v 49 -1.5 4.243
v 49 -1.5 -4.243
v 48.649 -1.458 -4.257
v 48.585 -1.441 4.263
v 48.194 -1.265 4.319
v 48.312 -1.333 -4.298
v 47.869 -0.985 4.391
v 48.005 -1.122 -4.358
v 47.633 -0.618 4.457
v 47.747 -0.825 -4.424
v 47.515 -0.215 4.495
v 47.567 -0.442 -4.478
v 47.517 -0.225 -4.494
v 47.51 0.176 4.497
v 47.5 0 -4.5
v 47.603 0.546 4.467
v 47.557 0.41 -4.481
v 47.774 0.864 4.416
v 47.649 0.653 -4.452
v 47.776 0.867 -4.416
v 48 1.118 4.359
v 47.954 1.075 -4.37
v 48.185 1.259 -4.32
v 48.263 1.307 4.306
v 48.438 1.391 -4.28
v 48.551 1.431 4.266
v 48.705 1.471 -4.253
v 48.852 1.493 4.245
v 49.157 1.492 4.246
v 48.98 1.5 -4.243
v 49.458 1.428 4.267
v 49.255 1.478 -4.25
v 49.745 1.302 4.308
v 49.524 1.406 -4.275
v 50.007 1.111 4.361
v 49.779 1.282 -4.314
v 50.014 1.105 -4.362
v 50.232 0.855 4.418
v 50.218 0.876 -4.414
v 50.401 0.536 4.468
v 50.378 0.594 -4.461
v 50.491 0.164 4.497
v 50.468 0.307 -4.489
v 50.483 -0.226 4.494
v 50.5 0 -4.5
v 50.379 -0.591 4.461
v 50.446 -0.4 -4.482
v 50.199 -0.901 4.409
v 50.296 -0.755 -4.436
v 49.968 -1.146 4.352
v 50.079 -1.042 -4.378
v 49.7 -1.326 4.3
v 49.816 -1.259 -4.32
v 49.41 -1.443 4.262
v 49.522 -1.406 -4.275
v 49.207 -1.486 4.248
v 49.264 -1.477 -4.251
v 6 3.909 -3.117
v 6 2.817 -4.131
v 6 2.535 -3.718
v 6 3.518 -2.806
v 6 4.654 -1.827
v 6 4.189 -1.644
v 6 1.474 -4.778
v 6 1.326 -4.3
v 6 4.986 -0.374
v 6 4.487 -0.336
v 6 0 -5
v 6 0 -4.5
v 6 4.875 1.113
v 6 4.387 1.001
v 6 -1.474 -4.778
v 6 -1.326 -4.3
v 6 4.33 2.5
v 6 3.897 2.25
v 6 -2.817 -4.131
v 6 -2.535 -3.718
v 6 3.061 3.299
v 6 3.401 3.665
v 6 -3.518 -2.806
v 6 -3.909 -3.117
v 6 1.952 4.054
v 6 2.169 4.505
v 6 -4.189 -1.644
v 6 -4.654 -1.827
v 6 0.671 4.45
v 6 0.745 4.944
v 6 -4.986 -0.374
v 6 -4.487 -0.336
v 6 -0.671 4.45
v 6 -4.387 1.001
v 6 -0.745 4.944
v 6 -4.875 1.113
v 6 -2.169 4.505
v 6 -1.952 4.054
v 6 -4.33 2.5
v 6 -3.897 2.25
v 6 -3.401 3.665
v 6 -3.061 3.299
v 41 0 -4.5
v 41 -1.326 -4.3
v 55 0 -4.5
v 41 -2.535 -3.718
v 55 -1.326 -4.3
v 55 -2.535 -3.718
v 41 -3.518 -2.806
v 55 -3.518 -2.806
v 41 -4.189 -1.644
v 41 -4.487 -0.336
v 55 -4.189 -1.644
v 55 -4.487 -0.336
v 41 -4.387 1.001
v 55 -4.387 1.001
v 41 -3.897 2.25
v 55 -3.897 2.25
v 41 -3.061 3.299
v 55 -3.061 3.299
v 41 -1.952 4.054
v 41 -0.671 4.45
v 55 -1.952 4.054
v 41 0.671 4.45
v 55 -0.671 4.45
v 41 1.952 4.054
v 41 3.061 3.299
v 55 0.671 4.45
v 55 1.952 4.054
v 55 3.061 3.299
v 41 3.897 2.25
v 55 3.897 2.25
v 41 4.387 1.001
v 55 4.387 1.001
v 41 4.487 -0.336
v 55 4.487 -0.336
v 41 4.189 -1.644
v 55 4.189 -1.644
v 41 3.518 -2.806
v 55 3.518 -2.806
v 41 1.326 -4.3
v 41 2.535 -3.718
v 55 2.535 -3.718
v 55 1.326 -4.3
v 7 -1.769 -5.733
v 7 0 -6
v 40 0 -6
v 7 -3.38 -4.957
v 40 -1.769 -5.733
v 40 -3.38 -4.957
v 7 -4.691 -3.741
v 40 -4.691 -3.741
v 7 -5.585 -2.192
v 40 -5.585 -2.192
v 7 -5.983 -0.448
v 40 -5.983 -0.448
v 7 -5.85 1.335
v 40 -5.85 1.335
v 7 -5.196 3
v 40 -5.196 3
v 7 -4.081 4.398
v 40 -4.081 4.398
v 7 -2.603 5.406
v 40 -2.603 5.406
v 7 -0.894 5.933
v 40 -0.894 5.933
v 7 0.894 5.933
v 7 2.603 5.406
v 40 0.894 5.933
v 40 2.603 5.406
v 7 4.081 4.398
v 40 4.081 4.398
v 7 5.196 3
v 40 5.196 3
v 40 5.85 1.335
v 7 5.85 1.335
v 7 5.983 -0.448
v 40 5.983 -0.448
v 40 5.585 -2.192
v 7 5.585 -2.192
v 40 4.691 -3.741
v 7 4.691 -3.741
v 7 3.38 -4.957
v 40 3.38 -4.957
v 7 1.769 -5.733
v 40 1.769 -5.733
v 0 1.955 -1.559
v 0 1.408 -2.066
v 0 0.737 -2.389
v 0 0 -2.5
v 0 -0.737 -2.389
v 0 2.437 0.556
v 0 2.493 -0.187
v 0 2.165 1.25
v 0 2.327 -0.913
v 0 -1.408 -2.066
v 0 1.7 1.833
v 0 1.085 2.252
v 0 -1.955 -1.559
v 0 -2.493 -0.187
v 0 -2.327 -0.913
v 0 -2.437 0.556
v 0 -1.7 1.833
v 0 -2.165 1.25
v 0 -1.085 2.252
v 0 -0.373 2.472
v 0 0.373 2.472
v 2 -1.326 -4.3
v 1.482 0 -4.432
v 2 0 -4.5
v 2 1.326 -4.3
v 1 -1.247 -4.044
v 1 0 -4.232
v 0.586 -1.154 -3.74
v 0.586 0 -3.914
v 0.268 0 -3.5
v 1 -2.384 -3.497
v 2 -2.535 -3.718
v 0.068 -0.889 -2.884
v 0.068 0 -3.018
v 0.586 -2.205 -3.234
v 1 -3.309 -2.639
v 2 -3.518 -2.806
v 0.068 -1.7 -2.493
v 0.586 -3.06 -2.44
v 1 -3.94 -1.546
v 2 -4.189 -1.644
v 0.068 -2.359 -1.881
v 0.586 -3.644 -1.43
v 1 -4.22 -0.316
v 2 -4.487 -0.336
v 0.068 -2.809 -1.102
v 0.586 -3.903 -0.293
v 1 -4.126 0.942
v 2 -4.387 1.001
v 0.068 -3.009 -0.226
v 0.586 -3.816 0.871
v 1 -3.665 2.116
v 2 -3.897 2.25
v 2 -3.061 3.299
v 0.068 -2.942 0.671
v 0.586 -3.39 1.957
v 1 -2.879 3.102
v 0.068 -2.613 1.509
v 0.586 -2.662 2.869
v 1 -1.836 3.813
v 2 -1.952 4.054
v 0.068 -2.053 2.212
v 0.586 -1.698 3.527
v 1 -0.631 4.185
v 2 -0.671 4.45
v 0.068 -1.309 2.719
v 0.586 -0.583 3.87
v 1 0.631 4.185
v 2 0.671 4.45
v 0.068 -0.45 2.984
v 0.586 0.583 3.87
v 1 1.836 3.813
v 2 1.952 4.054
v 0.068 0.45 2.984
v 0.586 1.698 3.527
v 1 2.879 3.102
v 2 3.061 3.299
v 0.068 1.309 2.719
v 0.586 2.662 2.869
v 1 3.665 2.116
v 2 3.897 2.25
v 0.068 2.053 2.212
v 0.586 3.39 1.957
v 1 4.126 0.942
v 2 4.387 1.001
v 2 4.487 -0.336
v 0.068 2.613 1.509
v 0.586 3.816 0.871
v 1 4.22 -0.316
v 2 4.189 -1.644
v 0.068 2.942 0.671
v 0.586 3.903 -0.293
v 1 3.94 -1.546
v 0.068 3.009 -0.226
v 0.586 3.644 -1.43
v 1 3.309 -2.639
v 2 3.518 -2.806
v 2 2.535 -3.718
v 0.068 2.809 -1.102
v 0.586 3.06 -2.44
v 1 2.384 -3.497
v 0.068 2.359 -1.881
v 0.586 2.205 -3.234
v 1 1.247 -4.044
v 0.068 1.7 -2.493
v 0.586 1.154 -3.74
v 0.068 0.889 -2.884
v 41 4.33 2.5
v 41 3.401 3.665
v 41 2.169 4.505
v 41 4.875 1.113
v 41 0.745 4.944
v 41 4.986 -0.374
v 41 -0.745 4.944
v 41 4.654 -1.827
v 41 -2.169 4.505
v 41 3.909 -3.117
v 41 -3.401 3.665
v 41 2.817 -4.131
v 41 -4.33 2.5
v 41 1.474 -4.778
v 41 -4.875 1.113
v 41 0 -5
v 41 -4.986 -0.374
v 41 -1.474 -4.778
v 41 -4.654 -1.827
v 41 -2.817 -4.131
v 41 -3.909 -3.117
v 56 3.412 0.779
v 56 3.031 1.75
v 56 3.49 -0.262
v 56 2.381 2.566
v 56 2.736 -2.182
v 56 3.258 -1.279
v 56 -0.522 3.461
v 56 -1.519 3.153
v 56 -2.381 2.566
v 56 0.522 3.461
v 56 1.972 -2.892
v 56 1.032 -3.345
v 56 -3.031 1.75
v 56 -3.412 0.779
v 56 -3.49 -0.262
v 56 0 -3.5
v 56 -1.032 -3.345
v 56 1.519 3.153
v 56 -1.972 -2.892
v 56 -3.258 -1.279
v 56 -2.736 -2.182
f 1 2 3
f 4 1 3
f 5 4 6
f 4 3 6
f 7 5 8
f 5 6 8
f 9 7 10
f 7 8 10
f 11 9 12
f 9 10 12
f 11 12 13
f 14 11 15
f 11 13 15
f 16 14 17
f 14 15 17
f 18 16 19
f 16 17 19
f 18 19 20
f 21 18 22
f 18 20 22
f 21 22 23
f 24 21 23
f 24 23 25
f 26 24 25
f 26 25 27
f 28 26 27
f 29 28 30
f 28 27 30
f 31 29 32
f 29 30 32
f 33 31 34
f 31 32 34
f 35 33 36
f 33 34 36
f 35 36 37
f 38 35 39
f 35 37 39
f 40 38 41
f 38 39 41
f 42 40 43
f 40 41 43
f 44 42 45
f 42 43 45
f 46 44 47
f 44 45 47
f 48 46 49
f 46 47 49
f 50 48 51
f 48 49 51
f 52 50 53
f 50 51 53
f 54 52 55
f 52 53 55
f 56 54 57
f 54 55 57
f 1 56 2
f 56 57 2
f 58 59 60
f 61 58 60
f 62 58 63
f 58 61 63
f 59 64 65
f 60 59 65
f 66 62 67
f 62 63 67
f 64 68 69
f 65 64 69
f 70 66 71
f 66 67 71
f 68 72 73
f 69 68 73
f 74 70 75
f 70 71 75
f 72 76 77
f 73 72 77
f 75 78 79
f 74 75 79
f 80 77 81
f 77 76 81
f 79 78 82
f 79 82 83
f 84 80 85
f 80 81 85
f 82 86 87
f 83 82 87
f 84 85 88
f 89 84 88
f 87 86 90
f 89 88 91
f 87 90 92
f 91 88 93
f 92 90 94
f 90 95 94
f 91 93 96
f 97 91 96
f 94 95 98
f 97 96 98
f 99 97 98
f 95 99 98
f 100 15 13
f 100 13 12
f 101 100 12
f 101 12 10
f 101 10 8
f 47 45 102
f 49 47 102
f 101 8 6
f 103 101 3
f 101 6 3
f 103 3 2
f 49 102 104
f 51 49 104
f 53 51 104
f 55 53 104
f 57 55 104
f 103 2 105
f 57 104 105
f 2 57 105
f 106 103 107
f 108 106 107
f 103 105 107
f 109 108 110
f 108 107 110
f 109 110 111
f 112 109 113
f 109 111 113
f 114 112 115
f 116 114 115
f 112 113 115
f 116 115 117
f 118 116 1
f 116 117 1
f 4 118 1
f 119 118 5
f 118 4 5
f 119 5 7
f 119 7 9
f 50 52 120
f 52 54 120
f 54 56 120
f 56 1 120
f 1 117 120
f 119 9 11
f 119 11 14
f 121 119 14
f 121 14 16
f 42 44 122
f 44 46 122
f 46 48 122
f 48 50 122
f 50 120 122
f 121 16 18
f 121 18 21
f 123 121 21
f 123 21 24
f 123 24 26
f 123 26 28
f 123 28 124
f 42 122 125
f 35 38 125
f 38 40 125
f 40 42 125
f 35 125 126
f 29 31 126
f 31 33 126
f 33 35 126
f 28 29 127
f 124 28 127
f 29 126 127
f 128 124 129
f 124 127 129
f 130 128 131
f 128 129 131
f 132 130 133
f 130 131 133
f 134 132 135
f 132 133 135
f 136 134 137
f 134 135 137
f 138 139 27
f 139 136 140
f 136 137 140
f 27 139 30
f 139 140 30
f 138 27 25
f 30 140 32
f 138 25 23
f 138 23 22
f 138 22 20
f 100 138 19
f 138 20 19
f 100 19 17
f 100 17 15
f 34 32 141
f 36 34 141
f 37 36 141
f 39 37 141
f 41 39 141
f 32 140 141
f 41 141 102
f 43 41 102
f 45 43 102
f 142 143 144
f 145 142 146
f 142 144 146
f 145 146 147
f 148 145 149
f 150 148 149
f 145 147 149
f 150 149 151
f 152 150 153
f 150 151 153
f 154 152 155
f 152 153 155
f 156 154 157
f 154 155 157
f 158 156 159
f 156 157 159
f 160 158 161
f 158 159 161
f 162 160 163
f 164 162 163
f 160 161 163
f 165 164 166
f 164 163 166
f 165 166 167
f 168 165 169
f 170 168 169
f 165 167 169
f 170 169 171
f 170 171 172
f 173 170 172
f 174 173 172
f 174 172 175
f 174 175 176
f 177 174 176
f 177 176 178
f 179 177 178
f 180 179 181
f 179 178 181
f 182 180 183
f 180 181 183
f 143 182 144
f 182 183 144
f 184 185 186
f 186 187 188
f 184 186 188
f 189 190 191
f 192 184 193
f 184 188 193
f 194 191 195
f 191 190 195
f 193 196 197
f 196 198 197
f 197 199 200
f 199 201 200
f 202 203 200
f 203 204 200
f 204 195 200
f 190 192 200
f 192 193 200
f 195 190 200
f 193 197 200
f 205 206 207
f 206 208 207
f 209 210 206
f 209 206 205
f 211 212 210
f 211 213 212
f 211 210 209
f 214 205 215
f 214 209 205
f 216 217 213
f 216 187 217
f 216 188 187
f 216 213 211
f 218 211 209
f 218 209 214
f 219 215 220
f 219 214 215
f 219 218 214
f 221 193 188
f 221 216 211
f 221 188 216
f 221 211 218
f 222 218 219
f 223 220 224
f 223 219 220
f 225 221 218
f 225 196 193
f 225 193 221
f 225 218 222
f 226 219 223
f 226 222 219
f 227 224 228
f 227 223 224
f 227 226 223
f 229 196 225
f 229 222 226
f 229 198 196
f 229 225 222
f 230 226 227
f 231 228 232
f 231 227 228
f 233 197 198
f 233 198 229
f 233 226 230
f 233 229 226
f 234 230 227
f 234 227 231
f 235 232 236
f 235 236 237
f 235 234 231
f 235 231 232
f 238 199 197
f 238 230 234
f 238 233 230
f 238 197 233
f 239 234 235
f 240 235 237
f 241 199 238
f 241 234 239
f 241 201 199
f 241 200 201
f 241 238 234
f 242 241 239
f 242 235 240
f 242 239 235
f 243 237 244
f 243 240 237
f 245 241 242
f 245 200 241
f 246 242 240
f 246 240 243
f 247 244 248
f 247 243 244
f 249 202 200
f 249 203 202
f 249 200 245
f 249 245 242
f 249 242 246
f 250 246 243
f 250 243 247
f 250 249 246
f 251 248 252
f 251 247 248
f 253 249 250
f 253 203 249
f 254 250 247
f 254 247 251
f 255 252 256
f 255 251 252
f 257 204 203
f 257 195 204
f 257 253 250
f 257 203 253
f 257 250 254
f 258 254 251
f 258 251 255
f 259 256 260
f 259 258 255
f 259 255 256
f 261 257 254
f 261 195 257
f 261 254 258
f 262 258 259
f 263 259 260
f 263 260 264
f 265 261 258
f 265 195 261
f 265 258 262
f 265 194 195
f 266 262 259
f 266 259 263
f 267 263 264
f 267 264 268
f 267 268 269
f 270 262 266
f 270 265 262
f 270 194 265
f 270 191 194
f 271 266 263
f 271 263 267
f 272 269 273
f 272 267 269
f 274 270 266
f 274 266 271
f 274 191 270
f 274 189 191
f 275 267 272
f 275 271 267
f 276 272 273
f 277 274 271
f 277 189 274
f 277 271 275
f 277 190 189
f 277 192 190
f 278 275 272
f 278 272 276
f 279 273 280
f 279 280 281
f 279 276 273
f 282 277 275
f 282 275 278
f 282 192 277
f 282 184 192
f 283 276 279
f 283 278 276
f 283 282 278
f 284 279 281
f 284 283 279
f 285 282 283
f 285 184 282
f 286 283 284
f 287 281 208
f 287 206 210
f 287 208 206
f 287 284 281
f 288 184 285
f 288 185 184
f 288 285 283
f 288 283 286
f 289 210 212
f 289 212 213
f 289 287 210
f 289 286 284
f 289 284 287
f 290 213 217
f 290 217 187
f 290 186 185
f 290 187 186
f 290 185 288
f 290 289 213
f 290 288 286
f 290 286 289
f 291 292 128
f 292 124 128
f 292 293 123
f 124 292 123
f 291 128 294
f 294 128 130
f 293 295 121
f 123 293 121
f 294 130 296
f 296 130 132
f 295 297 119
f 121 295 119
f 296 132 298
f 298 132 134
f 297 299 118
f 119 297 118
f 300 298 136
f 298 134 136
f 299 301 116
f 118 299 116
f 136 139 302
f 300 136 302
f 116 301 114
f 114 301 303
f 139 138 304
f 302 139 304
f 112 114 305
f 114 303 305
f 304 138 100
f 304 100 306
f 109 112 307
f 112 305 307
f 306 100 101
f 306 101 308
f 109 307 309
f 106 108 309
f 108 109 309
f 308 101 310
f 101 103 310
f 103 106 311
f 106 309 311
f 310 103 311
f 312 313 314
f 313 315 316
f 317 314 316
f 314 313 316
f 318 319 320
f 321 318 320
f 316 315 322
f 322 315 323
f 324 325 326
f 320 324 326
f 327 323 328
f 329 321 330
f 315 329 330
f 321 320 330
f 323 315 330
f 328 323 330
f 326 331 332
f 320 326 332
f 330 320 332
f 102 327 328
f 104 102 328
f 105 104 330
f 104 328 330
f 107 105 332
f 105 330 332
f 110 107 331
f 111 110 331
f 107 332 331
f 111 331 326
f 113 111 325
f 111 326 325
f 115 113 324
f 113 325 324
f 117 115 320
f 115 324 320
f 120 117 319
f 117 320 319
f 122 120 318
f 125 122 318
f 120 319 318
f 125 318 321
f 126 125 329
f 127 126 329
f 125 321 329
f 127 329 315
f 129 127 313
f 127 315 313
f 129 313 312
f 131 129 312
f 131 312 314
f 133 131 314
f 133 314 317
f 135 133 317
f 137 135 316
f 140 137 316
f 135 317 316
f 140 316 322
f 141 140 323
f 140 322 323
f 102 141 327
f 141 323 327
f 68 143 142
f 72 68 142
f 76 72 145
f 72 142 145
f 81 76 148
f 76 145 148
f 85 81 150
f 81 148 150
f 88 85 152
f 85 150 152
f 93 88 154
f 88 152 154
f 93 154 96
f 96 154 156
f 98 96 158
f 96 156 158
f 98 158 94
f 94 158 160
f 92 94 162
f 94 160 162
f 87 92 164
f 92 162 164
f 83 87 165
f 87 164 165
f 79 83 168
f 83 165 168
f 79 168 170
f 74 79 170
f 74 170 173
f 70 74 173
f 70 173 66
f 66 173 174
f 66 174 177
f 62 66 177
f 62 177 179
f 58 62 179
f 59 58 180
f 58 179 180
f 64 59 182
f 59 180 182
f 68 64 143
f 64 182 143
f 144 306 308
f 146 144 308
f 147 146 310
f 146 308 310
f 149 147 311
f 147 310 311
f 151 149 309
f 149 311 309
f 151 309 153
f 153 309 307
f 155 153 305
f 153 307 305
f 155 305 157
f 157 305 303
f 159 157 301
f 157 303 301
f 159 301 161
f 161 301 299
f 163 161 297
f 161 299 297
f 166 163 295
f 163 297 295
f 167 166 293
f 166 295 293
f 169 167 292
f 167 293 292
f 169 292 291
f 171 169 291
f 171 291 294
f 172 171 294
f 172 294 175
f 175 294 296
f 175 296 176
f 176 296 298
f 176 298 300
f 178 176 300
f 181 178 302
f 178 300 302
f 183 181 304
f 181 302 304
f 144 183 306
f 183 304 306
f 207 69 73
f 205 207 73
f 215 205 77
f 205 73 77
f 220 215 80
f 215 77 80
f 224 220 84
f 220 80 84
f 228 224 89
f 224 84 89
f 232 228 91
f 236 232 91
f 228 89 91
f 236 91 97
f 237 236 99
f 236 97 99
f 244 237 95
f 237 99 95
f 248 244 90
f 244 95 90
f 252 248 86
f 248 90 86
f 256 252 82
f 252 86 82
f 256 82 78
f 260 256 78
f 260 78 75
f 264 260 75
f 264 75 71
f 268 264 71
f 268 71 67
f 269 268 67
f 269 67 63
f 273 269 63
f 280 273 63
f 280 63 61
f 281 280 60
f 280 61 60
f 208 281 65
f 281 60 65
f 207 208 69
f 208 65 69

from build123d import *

# Parameters (mm, degrees)
CHAMFER2_SIZE            = 1
FILLET1_R                = 2
F_3_0_3_DIAMETER_HOLE1_D = 3


with BuildPart() as part:
    # Sketch1 → Revolve1 (revolve)
    with BuildSketch(Plane.XY, mode=Mode.PRIVATE) as revolve1_sk:
        Polygon((0, 0), (0, 4.5), (6, 4.5), (6, 6), (41, 6), (41, 4.5), (56, 4.5), (56, 0), align=None)
    revolve(revolve1_sk.sketch.rotate(Axis((0, 0, 0), (-1, 0, 0)), 90), axis=Axis((0, 0, 0), (-1, 0, 0)))

    # Chamfer2
    chamfer2_edges = [part.edges().sort_by_distance(p)[0] for p in [
        (56, 0, 4.5),
        (41, 0, 6),
        (6, 0, 6),
    ]]
    chamfer(chamfer2_edges, length=CHAMFER2_SIZE)

    # Fillet1
    fillet1_edges = [part.edges().sort_by_distance(p)[0] for p in [
        (0, 0, 4.5),
    ]]
    fillet(fillet1_edges, radius=FILLET1_R)

    # Ø3.0 (3) Diameter Hole1 (through all)
    with Locations(Plane(origin=(49, 0, 4.5), x_dir=(0, 1, 0), z_dir=(0, 0, 1))):
        with Locations((0, 0)):
            Hole(F_3_0_3_DIAMETER_HOLE1_D / 2)


solid = part.part
